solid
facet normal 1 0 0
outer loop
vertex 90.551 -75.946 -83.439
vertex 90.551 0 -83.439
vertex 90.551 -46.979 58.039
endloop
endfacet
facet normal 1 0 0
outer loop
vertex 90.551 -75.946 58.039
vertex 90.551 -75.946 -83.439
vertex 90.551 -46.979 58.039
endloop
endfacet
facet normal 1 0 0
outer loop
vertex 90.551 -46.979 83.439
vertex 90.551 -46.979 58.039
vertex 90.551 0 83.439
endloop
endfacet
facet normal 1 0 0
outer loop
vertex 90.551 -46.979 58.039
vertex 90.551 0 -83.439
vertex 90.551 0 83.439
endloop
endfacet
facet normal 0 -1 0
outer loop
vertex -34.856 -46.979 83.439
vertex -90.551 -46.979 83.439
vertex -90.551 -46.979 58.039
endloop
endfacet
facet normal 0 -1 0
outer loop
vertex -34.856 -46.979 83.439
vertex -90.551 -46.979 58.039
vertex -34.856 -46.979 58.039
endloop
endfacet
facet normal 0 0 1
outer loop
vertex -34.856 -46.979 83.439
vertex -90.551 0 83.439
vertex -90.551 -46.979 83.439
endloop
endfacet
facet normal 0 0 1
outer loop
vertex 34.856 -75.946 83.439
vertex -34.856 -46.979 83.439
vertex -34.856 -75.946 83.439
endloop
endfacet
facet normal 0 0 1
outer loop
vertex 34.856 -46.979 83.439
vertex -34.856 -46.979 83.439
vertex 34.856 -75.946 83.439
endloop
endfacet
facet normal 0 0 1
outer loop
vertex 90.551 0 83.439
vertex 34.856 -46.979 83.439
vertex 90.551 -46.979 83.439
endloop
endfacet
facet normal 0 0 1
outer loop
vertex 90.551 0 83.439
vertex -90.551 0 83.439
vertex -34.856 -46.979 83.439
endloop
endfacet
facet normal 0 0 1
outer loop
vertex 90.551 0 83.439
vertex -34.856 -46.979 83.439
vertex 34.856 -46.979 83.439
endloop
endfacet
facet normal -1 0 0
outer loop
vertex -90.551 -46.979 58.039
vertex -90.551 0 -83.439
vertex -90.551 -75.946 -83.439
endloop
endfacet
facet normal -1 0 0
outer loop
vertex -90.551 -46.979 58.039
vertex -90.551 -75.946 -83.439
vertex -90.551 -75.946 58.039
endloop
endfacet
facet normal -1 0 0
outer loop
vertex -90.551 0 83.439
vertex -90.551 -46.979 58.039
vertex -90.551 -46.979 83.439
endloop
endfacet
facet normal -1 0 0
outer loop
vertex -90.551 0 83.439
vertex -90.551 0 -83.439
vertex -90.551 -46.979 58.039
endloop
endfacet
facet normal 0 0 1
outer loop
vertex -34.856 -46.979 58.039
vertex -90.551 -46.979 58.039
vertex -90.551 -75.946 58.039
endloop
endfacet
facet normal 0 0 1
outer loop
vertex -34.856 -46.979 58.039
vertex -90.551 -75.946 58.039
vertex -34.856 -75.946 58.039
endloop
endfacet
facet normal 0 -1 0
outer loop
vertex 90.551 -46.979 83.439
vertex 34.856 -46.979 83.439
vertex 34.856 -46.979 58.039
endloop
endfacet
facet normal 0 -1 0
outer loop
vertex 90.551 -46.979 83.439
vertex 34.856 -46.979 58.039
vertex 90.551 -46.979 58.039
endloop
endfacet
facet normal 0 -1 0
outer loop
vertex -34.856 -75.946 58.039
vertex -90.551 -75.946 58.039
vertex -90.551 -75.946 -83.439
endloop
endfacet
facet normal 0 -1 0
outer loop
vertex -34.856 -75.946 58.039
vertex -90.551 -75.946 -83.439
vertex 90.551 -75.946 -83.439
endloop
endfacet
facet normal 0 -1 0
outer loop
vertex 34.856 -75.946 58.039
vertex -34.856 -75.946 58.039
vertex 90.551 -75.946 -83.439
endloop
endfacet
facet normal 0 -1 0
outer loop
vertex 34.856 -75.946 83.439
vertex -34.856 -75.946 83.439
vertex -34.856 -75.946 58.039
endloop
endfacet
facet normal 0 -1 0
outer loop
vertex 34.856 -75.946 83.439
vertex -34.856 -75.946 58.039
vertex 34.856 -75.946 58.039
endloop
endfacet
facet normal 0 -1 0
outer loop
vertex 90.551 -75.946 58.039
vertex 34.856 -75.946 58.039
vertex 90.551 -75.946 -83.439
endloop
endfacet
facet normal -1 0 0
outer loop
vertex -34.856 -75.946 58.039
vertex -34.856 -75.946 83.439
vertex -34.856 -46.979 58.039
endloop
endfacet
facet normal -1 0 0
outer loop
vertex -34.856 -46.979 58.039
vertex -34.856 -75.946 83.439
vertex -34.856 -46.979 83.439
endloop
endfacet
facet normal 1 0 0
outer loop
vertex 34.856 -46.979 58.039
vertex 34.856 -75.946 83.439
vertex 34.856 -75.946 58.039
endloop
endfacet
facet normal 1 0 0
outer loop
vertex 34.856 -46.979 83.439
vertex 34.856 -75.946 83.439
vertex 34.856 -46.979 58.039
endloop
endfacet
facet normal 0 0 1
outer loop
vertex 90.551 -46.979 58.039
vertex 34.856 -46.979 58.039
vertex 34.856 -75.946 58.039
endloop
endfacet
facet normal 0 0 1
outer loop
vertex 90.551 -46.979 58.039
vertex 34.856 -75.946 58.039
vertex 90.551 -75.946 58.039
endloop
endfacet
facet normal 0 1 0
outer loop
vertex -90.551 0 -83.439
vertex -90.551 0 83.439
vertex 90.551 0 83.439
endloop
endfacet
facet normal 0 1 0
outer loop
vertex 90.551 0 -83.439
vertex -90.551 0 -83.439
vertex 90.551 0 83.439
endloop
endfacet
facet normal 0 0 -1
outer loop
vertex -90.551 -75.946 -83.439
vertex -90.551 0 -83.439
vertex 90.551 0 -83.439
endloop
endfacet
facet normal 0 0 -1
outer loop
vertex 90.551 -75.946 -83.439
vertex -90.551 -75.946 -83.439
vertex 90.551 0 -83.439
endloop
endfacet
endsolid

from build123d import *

# Parameters (mm, degrees)
F0_W     = 181.102
F0_H     = 166.878
F1_DEPTH = 75.946
F2_W     = 55.6948
F2_H     = 28.966822
F3_DEPTH = 25.4


with BuildPart() as f1:
    # F0 (on Front) → F1 (new body)
    with BuildSketch(Plane.XZ):
        Rectangle(F0_W, F0_H)
    extrude(amount=F1_DEPTH)

    # F2 (on face) → F3 (cut)
    with BuildSketch(Plane.XY.offset(83.439)):
        with Locations((-62.7036, -61.462589)):
            Rectangle(F2_W, F2_H)
        with Locations((62.7036, -61.462589)):
            Rectangle(F2_W, F2_H)
    extrude(amount=-F3_DEPTH, mode=Mode.SUBTRACT)


solid = f1.part
